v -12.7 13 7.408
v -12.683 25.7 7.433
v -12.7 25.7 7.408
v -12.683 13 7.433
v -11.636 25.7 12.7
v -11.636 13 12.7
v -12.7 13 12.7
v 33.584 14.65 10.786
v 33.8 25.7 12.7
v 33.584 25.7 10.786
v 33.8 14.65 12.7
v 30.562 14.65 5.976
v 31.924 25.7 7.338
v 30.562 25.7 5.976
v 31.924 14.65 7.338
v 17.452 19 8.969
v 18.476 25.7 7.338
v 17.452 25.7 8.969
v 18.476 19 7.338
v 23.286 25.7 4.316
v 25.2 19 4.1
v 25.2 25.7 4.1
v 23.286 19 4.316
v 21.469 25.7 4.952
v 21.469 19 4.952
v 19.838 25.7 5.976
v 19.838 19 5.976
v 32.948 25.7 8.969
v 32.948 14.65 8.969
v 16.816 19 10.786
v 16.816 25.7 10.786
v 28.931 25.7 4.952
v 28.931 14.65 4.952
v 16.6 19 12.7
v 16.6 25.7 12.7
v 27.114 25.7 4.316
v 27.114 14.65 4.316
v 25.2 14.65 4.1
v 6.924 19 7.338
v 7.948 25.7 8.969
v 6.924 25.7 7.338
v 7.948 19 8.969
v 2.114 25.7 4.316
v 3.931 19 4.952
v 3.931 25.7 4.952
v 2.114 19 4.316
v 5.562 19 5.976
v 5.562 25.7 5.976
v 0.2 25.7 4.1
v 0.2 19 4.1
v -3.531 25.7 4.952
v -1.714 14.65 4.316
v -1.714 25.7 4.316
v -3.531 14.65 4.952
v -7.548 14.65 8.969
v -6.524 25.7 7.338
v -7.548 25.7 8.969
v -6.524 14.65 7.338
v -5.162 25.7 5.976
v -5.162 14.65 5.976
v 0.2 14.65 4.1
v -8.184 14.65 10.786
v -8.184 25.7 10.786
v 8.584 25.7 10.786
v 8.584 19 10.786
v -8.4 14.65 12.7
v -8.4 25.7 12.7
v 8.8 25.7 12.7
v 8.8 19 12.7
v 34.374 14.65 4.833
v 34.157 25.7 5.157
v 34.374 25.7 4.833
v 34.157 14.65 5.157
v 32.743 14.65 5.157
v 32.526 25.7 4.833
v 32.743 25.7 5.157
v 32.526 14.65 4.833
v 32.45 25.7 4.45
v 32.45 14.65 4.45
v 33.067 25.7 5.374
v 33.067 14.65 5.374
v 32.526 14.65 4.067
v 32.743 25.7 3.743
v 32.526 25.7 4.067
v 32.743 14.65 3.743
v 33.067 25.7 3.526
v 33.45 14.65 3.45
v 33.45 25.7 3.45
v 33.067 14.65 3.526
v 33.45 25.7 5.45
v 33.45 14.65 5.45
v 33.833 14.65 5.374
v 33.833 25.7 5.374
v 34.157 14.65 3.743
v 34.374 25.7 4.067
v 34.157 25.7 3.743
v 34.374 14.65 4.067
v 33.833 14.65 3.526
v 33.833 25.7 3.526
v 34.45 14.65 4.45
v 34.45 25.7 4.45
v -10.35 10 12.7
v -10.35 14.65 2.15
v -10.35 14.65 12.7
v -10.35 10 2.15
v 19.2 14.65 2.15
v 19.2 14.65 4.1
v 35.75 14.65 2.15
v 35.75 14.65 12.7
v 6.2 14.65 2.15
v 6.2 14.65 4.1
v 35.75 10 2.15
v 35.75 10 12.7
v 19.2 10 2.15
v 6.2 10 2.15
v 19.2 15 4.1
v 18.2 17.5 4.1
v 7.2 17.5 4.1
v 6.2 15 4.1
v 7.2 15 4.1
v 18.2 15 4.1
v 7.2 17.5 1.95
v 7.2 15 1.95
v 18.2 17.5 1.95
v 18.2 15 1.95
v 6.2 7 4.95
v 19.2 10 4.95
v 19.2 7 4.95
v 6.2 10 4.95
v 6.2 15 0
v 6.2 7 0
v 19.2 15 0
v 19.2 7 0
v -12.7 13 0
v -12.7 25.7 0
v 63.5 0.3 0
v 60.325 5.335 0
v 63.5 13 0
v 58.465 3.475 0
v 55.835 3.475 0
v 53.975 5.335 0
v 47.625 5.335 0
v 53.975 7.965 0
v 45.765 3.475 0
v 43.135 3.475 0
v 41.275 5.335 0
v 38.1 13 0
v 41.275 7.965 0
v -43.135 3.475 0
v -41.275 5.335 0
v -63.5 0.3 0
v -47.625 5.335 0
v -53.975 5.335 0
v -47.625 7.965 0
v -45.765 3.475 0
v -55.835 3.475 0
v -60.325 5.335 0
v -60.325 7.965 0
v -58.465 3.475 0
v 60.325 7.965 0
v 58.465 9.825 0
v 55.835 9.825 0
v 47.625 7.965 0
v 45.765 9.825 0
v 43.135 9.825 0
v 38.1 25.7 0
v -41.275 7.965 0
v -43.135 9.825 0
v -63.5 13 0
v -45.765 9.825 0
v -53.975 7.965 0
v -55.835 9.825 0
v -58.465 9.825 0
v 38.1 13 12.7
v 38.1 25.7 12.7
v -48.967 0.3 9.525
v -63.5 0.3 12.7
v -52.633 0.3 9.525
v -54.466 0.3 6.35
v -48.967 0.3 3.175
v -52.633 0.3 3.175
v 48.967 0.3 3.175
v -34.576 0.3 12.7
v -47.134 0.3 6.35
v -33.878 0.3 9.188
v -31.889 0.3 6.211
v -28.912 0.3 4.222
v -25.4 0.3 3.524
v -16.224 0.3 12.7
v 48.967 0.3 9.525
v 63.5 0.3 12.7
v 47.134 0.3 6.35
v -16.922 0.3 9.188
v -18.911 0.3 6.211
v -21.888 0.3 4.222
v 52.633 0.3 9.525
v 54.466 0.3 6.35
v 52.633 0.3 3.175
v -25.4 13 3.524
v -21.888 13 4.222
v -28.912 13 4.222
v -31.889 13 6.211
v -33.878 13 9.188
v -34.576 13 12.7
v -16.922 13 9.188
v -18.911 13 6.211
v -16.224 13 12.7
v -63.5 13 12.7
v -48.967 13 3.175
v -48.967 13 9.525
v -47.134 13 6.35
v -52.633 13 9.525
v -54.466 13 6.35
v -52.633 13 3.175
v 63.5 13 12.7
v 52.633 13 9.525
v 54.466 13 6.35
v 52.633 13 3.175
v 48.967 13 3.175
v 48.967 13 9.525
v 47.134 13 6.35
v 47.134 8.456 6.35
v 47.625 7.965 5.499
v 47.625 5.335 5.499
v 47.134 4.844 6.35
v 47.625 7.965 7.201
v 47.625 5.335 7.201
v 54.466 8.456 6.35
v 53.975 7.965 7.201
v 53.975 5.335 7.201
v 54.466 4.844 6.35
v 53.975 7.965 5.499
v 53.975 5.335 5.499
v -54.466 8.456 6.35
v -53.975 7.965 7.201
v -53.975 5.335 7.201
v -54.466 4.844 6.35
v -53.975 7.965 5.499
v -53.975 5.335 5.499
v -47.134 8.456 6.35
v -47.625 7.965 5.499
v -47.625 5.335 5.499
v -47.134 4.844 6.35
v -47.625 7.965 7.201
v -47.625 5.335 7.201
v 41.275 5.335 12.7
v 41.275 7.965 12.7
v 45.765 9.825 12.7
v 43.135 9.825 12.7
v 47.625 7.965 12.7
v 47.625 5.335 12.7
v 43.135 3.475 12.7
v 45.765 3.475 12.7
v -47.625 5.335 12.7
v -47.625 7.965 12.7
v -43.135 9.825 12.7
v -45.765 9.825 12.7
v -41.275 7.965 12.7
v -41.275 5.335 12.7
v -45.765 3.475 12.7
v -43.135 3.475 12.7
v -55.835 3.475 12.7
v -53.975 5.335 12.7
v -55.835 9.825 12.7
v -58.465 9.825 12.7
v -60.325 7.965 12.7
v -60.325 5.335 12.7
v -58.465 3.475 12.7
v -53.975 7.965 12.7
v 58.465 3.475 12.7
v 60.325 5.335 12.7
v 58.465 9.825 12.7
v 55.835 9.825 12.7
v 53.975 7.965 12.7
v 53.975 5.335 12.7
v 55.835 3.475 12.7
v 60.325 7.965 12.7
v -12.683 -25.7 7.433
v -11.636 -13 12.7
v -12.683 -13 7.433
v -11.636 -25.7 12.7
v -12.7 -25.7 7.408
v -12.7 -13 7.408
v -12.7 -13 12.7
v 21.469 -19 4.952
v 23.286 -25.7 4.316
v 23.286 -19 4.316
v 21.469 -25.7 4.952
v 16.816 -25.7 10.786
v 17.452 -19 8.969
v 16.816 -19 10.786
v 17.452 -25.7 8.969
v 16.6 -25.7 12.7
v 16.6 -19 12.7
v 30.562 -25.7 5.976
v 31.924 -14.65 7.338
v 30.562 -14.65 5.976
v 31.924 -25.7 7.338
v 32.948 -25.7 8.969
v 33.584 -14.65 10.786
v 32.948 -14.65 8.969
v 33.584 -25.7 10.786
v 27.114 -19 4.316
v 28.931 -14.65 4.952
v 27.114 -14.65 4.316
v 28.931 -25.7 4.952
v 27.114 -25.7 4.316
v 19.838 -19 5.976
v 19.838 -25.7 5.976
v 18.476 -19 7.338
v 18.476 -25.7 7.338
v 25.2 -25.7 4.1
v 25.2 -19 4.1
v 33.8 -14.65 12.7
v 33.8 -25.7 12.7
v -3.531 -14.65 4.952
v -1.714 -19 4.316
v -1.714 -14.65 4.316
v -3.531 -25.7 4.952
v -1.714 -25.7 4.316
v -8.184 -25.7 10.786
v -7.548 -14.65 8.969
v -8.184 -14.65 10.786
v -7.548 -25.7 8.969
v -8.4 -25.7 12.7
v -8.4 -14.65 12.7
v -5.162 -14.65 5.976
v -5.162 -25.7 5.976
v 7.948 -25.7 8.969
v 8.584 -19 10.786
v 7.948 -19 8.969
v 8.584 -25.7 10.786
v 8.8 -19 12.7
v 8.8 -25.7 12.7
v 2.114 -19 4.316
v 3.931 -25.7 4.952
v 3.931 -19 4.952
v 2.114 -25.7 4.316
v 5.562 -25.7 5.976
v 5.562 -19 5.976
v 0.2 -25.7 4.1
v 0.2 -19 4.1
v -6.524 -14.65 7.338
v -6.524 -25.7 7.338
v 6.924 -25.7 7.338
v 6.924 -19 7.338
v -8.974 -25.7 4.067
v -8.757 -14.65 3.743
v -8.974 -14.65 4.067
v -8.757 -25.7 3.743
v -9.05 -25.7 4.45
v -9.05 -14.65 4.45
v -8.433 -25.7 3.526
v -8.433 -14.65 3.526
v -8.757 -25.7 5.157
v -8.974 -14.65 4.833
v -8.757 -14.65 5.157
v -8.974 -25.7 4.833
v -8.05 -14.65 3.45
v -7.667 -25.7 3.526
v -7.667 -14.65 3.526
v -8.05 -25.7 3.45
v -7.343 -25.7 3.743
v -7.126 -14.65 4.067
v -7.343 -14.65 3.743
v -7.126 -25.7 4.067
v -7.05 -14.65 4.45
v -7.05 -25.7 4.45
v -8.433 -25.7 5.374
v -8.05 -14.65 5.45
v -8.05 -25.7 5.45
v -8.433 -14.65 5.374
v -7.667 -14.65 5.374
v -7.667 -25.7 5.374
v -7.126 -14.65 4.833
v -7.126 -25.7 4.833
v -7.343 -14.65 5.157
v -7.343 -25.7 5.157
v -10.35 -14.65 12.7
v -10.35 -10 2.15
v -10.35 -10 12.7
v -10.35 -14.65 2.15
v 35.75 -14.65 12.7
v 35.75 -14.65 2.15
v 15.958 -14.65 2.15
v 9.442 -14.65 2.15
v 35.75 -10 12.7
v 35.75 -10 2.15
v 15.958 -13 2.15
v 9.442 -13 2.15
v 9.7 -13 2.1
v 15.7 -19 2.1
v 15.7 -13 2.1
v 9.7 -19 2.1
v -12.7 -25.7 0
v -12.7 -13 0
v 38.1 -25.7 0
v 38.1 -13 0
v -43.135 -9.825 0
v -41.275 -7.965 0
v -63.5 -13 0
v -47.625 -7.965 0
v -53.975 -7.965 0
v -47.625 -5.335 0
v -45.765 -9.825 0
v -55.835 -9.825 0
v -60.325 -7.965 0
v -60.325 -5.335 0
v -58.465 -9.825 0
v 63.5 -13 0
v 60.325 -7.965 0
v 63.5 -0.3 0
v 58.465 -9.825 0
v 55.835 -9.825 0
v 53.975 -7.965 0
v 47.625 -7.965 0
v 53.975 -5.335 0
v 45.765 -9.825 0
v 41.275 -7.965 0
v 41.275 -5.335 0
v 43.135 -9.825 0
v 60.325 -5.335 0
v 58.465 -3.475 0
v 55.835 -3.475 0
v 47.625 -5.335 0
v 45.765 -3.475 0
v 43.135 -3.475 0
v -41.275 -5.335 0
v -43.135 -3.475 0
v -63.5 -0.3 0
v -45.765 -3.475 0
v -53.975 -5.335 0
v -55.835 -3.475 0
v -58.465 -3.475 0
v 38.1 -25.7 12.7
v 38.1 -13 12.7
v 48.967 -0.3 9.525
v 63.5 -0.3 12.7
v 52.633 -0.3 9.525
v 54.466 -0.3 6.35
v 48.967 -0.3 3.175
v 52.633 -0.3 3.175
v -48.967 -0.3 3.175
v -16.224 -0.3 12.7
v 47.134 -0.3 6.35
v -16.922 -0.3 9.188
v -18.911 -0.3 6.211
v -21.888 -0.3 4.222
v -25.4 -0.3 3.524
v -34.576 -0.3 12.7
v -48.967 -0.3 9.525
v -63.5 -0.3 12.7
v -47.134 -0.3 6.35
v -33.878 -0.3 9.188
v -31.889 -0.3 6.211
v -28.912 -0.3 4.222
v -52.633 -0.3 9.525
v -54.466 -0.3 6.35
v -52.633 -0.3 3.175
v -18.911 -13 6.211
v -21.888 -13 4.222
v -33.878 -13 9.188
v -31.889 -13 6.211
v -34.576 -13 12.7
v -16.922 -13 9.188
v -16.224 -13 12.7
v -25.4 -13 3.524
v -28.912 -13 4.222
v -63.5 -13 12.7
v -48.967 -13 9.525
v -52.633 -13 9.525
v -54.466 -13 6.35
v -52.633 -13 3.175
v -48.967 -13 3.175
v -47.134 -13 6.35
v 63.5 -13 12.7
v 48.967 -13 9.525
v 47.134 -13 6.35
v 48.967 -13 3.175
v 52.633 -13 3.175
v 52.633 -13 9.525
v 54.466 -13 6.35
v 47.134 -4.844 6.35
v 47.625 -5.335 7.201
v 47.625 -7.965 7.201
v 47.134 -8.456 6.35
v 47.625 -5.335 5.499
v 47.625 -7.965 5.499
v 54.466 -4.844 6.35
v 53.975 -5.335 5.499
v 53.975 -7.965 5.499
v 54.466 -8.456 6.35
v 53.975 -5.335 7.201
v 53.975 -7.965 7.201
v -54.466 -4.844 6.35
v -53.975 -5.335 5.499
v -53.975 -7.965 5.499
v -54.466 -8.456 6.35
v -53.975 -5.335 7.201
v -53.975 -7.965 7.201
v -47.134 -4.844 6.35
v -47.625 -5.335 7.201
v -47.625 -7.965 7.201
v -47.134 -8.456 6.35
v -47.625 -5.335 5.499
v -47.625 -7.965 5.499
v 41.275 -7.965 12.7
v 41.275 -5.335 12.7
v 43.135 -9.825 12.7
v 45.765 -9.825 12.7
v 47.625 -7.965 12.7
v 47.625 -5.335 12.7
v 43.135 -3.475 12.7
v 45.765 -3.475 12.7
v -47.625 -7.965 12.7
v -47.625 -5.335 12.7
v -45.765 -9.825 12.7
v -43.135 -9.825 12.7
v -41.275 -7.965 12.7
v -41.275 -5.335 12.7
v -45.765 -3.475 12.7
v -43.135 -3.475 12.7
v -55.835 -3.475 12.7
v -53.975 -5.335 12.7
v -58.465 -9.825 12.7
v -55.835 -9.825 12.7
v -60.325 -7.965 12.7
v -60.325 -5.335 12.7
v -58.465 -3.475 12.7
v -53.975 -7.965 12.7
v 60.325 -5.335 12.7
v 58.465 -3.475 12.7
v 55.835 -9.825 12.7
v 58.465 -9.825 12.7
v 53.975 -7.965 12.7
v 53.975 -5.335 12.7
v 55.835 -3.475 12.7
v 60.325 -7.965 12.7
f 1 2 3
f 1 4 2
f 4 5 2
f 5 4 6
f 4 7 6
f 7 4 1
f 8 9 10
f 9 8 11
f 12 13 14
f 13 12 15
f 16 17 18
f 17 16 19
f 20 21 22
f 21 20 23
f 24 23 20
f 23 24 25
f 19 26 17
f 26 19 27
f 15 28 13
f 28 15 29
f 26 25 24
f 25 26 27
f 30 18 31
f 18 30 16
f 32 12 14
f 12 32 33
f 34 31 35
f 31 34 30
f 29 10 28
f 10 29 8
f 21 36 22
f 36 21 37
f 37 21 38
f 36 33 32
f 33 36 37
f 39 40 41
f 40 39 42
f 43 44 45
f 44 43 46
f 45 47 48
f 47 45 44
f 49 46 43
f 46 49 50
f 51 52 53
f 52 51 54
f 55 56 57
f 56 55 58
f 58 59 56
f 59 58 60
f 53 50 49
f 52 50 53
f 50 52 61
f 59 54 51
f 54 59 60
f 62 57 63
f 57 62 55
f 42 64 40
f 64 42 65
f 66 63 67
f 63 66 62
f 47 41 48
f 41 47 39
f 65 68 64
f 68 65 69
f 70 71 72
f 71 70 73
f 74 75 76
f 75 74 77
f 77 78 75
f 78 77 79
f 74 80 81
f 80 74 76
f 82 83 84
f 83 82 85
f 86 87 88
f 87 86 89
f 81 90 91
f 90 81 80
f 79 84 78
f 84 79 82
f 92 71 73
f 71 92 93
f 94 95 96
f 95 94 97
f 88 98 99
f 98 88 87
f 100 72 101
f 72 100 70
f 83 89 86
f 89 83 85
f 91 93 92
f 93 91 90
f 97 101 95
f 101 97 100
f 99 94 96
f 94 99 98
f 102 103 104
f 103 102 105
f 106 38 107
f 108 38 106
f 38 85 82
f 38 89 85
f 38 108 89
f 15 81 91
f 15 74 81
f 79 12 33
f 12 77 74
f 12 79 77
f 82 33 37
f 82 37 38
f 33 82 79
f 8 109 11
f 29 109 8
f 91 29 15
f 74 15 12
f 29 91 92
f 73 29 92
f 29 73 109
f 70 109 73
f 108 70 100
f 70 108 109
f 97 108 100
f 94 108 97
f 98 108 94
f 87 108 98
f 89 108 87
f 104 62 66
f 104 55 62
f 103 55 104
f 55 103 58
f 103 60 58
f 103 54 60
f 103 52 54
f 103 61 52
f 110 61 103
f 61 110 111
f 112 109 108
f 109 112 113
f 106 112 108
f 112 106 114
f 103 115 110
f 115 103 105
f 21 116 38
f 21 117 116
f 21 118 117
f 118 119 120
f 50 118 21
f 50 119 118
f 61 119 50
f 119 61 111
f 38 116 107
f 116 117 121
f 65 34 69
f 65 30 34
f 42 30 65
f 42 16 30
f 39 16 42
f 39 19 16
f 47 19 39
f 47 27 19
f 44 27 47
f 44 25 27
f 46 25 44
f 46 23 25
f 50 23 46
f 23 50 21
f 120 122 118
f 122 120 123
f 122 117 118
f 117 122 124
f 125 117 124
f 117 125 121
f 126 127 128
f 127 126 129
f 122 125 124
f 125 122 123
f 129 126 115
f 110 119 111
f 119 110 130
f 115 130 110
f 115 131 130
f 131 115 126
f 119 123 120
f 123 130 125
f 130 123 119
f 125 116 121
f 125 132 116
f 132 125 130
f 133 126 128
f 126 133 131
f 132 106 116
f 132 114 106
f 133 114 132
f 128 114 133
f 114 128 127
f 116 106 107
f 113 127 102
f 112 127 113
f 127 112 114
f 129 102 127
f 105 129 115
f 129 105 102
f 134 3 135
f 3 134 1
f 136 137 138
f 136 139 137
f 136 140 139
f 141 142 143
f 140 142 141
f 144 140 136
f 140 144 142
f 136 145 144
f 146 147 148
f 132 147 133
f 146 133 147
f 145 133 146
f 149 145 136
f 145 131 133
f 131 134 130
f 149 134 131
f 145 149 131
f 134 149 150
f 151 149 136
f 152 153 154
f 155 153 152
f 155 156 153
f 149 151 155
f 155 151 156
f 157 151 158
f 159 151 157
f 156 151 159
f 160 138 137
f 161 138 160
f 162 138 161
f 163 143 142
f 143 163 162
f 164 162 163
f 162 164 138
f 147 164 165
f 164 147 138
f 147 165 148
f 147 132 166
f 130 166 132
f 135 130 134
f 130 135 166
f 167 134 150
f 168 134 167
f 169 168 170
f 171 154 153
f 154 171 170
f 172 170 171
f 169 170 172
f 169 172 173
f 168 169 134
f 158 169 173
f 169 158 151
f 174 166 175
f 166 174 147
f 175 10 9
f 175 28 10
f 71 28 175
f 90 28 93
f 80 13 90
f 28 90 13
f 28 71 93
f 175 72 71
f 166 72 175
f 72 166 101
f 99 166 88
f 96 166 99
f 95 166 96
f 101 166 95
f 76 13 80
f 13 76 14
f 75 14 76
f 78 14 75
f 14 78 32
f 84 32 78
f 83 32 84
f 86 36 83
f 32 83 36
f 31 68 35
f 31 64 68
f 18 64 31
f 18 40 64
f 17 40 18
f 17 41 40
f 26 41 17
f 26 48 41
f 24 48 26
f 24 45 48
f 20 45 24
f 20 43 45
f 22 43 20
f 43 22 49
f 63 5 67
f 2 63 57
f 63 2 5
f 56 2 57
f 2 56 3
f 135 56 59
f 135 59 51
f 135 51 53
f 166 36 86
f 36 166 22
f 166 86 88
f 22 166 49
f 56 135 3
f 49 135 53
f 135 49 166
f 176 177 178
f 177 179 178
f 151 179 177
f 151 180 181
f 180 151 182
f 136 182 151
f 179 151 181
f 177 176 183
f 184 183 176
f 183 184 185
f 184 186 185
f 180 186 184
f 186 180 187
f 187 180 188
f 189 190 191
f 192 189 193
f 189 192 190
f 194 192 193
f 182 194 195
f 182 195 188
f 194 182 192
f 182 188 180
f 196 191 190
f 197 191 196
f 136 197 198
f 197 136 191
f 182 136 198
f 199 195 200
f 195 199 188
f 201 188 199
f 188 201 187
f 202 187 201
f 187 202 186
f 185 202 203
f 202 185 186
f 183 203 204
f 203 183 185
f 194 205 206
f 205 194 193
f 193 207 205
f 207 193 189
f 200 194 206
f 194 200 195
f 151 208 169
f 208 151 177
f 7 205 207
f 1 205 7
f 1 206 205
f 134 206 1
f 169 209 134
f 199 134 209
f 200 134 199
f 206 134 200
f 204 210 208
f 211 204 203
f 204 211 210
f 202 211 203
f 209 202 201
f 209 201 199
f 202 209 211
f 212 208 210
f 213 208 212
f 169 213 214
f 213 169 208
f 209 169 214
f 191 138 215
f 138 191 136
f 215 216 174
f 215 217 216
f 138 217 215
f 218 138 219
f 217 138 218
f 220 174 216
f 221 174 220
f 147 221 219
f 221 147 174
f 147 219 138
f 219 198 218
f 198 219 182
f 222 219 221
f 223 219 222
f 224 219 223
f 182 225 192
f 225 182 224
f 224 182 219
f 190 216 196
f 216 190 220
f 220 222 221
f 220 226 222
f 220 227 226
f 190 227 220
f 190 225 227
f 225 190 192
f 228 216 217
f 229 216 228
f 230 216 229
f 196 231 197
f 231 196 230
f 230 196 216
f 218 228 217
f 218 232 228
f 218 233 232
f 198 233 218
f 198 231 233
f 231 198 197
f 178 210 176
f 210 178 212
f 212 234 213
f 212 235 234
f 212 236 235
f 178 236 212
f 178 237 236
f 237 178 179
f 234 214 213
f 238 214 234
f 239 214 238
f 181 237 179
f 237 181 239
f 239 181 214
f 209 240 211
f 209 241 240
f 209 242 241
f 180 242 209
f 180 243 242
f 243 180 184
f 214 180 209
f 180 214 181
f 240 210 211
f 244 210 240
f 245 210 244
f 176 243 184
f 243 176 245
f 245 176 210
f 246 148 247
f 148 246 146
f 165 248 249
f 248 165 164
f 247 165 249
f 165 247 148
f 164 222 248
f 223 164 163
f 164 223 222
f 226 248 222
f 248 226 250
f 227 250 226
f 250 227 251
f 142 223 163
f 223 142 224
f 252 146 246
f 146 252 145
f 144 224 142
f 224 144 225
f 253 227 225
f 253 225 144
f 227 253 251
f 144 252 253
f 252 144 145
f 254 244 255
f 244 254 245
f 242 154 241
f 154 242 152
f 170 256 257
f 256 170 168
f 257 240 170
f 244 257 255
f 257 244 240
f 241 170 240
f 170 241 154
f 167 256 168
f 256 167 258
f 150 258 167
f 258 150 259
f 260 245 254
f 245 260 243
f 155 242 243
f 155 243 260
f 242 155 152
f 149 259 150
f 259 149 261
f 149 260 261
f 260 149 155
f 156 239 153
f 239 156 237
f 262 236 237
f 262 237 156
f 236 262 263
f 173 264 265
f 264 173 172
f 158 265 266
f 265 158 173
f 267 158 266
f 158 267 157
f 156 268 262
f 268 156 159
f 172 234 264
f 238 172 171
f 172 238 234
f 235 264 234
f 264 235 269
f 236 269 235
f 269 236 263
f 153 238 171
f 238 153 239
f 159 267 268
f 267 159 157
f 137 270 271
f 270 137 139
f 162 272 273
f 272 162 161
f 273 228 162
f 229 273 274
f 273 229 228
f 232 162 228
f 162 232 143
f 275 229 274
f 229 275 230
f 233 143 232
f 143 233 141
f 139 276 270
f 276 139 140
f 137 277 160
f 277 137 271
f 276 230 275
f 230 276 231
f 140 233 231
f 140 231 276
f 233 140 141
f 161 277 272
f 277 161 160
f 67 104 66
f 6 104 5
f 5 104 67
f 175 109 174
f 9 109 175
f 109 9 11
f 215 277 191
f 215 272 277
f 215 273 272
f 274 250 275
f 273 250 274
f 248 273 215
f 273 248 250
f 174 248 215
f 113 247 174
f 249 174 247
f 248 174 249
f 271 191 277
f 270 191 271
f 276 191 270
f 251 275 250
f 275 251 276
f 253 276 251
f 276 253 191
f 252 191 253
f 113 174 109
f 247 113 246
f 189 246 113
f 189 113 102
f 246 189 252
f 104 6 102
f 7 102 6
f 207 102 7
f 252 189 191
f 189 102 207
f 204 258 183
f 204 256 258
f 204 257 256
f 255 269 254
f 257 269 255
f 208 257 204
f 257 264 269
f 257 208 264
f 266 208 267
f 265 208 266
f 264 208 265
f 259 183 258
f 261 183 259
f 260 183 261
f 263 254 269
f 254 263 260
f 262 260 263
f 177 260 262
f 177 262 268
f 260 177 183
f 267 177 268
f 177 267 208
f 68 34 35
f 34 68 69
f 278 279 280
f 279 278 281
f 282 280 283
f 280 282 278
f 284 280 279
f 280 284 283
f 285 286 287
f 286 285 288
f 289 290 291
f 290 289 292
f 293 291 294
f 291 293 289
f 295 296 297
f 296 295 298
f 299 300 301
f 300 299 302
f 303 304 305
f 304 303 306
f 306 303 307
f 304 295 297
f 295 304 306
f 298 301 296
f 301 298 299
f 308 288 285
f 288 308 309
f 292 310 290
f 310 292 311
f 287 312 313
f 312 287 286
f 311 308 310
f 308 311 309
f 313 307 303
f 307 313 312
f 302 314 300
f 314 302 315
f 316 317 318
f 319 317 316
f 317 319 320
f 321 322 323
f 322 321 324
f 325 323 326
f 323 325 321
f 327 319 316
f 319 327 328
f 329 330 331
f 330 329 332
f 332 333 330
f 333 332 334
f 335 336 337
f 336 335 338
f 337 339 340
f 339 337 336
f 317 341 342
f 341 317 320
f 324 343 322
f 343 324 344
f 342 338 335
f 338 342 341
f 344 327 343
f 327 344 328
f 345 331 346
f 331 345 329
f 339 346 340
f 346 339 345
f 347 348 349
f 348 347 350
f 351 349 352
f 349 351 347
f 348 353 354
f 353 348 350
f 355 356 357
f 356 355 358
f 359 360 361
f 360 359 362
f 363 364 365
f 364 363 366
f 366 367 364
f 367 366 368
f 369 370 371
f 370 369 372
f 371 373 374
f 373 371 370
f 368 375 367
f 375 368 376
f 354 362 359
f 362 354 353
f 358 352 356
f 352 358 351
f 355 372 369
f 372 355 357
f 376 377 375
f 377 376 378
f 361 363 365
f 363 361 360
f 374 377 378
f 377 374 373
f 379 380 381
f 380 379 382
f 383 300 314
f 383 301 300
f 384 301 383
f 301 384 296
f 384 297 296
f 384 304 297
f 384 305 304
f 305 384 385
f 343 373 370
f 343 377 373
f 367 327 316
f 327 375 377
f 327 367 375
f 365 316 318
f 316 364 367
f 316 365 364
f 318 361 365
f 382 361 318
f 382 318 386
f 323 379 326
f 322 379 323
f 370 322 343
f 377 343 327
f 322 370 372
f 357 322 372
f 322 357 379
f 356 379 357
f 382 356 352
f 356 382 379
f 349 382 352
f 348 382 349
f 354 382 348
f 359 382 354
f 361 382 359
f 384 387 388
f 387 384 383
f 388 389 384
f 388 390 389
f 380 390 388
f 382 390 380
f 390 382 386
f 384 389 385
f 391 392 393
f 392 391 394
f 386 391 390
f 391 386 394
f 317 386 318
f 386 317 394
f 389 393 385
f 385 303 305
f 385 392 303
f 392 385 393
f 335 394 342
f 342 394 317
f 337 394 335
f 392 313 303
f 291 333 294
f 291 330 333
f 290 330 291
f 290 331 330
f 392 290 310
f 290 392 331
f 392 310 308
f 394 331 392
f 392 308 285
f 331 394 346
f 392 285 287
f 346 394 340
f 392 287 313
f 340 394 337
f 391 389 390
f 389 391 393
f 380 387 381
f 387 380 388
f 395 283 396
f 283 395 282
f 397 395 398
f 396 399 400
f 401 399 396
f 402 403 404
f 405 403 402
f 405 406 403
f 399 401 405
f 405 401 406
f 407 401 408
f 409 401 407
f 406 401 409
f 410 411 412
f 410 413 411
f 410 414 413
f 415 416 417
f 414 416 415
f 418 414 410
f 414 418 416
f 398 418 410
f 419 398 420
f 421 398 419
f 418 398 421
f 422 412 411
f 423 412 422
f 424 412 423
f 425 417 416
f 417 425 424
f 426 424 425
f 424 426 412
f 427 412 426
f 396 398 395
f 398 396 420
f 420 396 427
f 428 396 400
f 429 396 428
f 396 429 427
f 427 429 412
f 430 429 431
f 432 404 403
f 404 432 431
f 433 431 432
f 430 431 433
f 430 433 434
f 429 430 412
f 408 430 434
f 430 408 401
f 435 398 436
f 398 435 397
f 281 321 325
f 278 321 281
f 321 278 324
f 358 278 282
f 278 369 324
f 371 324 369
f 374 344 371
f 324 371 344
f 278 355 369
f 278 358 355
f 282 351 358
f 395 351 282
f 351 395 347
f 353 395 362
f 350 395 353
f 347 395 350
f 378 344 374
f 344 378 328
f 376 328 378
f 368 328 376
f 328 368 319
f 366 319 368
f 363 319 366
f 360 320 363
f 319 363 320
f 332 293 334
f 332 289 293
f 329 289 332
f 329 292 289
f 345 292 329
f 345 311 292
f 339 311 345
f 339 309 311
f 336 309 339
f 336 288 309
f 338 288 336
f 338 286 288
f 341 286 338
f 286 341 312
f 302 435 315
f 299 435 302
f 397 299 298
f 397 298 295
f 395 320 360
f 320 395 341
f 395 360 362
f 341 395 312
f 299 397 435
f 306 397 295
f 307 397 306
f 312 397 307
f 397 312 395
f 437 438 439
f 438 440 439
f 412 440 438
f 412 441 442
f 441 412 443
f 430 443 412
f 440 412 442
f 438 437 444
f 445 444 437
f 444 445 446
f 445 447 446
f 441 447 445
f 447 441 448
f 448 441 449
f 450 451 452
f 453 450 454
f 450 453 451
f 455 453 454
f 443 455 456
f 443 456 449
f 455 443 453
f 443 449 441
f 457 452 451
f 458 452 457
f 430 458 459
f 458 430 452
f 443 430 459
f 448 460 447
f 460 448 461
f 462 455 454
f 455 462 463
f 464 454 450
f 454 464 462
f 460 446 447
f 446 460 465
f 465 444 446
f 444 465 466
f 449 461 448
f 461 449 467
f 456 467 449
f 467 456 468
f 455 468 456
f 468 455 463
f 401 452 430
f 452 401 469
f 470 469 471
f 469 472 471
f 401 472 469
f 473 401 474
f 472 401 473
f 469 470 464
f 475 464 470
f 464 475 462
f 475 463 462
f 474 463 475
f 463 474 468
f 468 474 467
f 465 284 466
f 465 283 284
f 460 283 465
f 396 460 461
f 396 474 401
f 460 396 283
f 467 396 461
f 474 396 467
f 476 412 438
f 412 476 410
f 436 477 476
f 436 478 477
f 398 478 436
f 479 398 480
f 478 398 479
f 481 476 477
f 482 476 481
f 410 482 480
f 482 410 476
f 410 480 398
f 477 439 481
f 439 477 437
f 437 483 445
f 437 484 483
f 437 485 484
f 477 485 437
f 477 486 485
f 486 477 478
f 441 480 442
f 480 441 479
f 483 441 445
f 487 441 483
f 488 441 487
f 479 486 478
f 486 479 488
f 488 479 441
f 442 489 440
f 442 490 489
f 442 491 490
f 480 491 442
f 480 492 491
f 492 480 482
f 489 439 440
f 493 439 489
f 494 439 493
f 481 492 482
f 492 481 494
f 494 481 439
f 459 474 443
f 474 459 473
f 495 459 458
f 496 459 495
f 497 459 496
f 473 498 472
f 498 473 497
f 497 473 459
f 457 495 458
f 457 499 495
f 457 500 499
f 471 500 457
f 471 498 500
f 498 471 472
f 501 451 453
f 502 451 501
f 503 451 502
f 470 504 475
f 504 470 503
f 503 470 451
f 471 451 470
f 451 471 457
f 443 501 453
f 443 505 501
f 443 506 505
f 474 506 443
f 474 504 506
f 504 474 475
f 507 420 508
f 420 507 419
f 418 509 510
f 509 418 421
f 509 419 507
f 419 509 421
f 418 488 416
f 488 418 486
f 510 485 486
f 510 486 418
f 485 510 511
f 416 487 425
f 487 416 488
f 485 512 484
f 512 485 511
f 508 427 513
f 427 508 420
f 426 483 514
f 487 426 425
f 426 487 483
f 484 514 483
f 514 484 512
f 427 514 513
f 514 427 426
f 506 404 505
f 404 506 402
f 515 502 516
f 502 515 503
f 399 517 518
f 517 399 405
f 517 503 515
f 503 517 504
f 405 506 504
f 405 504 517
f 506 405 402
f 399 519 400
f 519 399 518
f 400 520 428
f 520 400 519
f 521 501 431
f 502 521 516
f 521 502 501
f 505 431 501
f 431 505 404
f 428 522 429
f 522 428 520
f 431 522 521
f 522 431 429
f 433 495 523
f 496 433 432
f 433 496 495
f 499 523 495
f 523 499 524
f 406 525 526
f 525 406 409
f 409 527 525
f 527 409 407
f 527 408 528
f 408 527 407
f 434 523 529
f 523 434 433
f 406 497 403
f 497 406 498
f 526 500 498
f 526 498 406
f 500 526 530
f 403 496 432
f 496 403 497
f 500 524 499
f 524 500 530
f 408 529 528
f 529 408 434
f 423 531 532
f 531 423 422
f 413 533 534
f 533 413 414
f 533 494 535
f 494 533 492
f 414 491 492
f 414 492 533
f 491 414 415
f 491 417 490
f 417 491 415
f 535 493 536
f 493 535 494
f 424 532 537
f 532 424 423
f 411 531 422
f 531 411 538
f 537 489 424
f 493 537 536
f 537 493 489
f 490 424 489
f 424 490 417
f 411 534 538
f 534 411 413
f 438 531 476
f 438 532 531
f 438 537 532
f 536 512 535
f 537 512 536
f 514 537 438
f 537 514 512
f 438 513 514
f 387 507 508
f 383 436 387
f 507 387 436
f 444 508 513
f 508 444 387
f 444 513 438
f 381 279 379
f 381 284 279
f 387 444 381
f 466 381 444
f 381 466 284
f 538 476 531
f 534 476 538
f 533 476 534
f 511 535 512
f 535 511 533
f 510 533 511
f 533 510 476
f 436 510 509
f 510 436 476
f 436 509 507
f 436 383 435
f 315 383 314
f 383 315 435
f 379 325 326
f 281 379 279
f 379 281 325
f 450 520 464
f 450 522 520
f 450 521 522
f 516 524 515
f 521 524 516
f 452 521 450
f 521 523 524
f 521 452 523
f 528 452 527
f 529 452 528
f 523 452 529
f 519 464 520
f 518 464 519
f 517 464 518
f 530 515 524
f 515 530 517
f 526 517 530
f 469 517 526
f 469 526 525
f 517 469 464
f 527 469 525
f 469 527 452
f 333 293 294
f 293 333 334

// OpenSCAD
// file: hardware.scad
// CC-BY-SA
// Created by Caitlyn Byrne
// last modified 05 November 2016

// [machine screw diameter, socket head diameter, socket head len, socket head hex key size, pan head diameter, pan head len, pan head hex key size, nut wide, nut thick]

m3 = [3,
5.5, 3, 2.5, 
5.7, 1.65, 2,
5.5, 2.4];

m4 = [4,
7, 4, 3,
7.6, 2.2, 2.5,
7, 3.2];

m5 = [5,
8.5, 5, 4,
9.5, 2.75, 3,
8, 4];

m6 = [6,
10, 6, 5,
10.5, 3.3, 4,
10,5];



m8 = [8,
13,8,6,
14,4.4, 5,
13,6.5];

m10 = [10,
16,10,8,
17.5, 5.5, 6,
17,8];

m12 = [12,
18,12,10,
21,6.6, 8,
19,10];

i1_4 = [1/4*25.4,
3/8*25.4, 1/4*25.4, 3/16*25.4,
0.492*25.4, 0.175*25.4, 5/32*25.4,
7/16*25.4, 7/32*25.4];

i8 = [0.138*25.4,
0.27*25.4, 0.164*25.4, 9/64*25.4,
0.322*25.4,0.115*25.4, 3/32*25.4,
11/32*25.4, 1/8*25.4];

/// indicies
machine_screw_diameter = 0;
socket_head_diameter = 1;
socket_head_len = 2;
socket_head_hex_key = 3;
pan_head_diameter = 4;
pan_head_len = 5;
pan_head_hex_key = 6;
nut_wide = 7;
nut_thick = 8;


e3d_clearance = 20;

groove_top_thick = 4;
groove_top_dia = 16;
groove_mid_thick = 6;
groove_mid_dia = 12;
groove_bot_thick = 4;
groove_bot_dia = 16;

lm8uu_diameter = 15;
lm8uu_long = 24;
lm8uu_shaft_diameter = 8;

//lm8uu_hor(zip_ties=true);

small_ziptie_wide = 3;
small_ziptie_thick = 2;

module lm8uu_hor(zip_ties=false){
    
    translate([-lm8uu_long/2,0,0])
    rotate([0,90,0])
    cylinder_outer(lm8uu_long, lm8uu_diameter/2, 32);
    if (zip_ties == "outer"){
        for(x = [1,-1]){
            translate([x*lm8uu_long/3-small_ziptie_wide/2,0,0])
            rotate([0,90,0])
            difference(){
                cylinder_outer(small_ziptie_wide, lm8uu_diameter/2+1+small_ziptie_thick, 32);
                translate([0,0,-1])
                cylinder_outer(small_ziptie_wide+2, lm8uu_diameter/2+1, 32);
            }
        }
    }
    if (zip_ties == "inner"){
        for(x = [1,-1]){
            translate([x*lm8uu_long/4-small_ziptie_wide/2,0,0])
            rotate([0,90,0])
            difference(){
                cylinder_outer(small_ziptie_wide, lm8uu_diameter/2+1+small_ziptie_thick, 32);
                translate([0,0,-1])
                cylinder_outer(small_ziptie_wide+2, lm8uu_diameter/2+1, 32);
            }
        }
    }
    if (zip_ties == "center"){
        for(x = [0]){
            translate([x*lm8uu_long/3-small_ziptie_wide/2,0,0])
            rotate([0,90,0])
            difference(){
                cylinder_outer(small_ziptie_wide, lm8uu_diameter/2+1+small_ziptie_thick, 32);
                translate([0,0,-1])
                cylinder_outer(small_ziptie_wide+2, lm8uu_diameter/2+1, 32);
            }
        }
    }
}


module groove(){
    translate([0,-groove_mid_thick/2-groove_bot_thick])
    rotate([-90,0,0])
    union(){
        translate([0,0,.5])
        cylinder_outer(groove_top_thick+groove_mid_thick+groove_bot_thick-1, groove_mid_dia/2, 36);
        cylinder_outer(groove_bot_thick, groove_bot_dia/2, 36);
        translate([0,0,groove_bot_thick+groove_mid_thick])
        cylinder_outer(groove_top_thick, groove_top_dia/2, 36);
    }
}

module nut(nut_wide = 5.7, nut_thick = 3, bolt_dia = 3.5, extend = false, layer_height = 0.25){
    // extend = go below 0 for z, to allow a clean cut.
    if (extend == true){
        translate([0,0,-2])
        cylinder_outer(nut_thick+2,nut_wide/2, 6);
    } else {
        cylinder_outer(nut_thick, nut_wide/2, 6);
    }
    intersection(){
        cylinder_outer(nut_thick*2, nut_wide/2, 6);
        union(){
            translate([0,0,nut_thick])
            cube([nut_wide*2, bolt_dia, layer_height*2], center=true);
            translate([0,0,nut_thick+layer_height])
            cube([bolt_dia, bolt_dia, layer_height*2], center=true);
        }
    }
}

module bolt_head(bolt_head_dia = 5.7, head_thick = 3.5, bolt_dia = 3.5, extend = false, layer_height = .25){
    if (extend == true){
        translate([0,0,-1])
        cylinder_outer(head_thick+1,bolt_head_dia/2, 18);
    } else {
        cylinder_outer(head_thick,bolt_head_dia/2, 18);
    }
    intersection(){
        cylinder_outer(head_thick*2,bolt_head_dia/2, 18);
        union(){
            translate([0,0,head_thick])
            cube([bolt_head_dia*2, bolt_dia, layer_height*2], center=true);
            translate([0,0,head_thick+layer_height])
            cube([bolt_dia, bolt_dia, layer_height*2], center=true);
        }
    }
}

module rounded_cube(size, r=3, center=false, fn=32){
    hull(){
        for (x = [-1,1], y=[1,-1]){
            translate([x*(size[0]/2-r),y*(size[1]/2-r),0])
            if(center==true){
                rotate([0,0,360/(fn*2)])
                cylinder_outerc(size[2],r,fn);
            } else {
                rotate([0,0,360/(fn*2)])
                cylinder_outer(size[2],r,fn);
            }
        }
    }
}

module spherical_cube(size, r=3, center=false, fn=32){
    render()
    hull(){
        for (x = [-1,1], y=[1,-1], z=[-1,1]){
            translate([x*(size[0]/2-r),y*(size[1]/2-r),z*(size[2]/2-r)])
            if(center==true){
                rotate([0,0,360/(fn*2)])
                sphere(r,$fn=fn);
            } else {
                rotate([0,0,360/(fn*2)])
                sphere(r,$fn=fn);
            }
        }
    }
}

module wall(pointslist,r=1.5,center=false,fn=32){
    union(){
        for (idx = [0:1:len(pointslist)-2]){
            hull(){
                if (center==false){
                    translate([pointslist[idx][0],pointslist[idx][1],0])
                    cylinder_outer(pointslist[idx][2], r, fn);
                    translate([pointslist[idx+1][0],pointslist[idx+1][1],0])
                    cylinder_outer(pointslist[idx+1][2], r, fn);
                } else {
                    translate([pointslist[idx][0],pointslist[idx][1],0])
                    cylinder_outerc(pointslist[idx][2], r, fn);
                    translate([pointslist[idx+1][0],pointslist[idx+1][1],0])
                    cylinder_outerc(pointslist[idx+1][2], r, fn);
                }
                
            }
        }
    }
}

module cylinder_outer(height,radius,fn){
   fudge = 1/cos(180/fn);
   cylinder(h=height,r=radius*fudge,$fn=fn);}
   
module cylinder_outer(height,radius,fn){
   fudge = 1/cos(180/fn);
   cylinder(h=height,r=radius*fudge,$fn=fn);}
   
module cylinder_outerc(height,radius,fn){
   fudge = 1/cos(180/fn);
   cylinder(h=height,r=radius*fudge,$fn=fn,center=true);}

module cylinder_outer2(height,r1,r2,fn){
   fudge = 1/cos(180/fn);
   cylinder(h=height,r1=r1*fudge,r2=r2*fudge,$fn=fn);}
   
module cylinder_outer2c(height,r1,r2,fn){
   fudge = 1/cos(180/fn);
   cylinder(h=height,r1=r1*fudge,r2=r2*fudge,$fn=fn,center=true);}

module circle_outer(radius,fn){
   fudge = 1/cos(180/fn);
   circle(r=radius*fudge,$fn=fn);}
// main file
include <hardware.scad>

//adj_ir();
//sr04();

//housing1();

translate([0,13,0]) tophalf();
translate([0,-13,0]) rotate(180) bottomhalf();

module tophalf(){
    translate([0,0,12.7])
    rotate([0,180,0])
    intersection(){
        housing1();
        translate([0,0,12.7/2])
        cube([6*25.4,2*25.4,12.7],center=true);
    }
}

module bottomhalf(){
    translate([0,0,12.7])
    intersection(){
        housing1();
        translate([0,0,-12.7/2])
        cube([6*25.4,2*25.4,12.7],center=true);
    }
}

module housing1(){
    difference(){
        translate([12.7,0,0]){
            difference(){
                translate([-25.4,0,0])
                cube([25.4*2,25.4,25.4],center=true);
                translate([12.7,-55/2+12.7,0])
                adj_ir();
                translate([-25.4,0,0])
                rotate([0,0,0])
                sr04();
            }
            difference(){
                translate([25.4,-12.7/2,0])
                cube([25.4*2,12.7,25.4],center=true);
                translate([12.7,-14,0])
                adj_ir();
            }
            translate([-25.4*2.5,-12.7/2,0])
            cube([25.4,12.7,25.4],center=true);
        }
        for (x = [-2,2,],z=[-.25,.25]){
            translate([x*25.4,-26,z*25.4])
            rotate([-90,0,0])
//            rotate(360/12)
            cylinder_outer(52,1/4*25.4/2,6);
        }
        for(x = [-1.75,1.75,2.25,-2.25]){
            translate([x*25.4,-12.7/2,-20])
            rotate(360/16)
            cylinder_outer(40,25.4/4/2,8);
        }
    }
}

module adj_ir(){
    translate([0,-55/2,0])
    rotate([-90,00,0]){
        irlong = 55;
        cylinder_outer(irlong, 9, 16);
        translate([0,0,irlong-12.7])
        cylinder_outer(12.7, 27/2, 16);
        cylinder_outer(irlong-12.7-15,27/2,16);
    }
}

module sr04(){
    sonar_spacing=41-16;
    tolerance = 0.6;
    rotate([-90,0,0]){
        for(x = [-sonar_spacing/2,sonar_spacing/2]){
            translate([x,0,0])
            cylinder(r=8+tolerance,h=15);
        }
        translate([0,0,.75])
        cube([45.5+tolerance,20.5+tolerance,1.8],center=true);
        hull(){
            /*for(x = [-3,3]){
                translate([x,7.5,0])
                cylinder(r=2.5+tolerance,h=6,$fn=16);
            }*/
            // Special crystal for vertical insertion
            for(x = [-3,3]){
                translate([x,7.5,0])
                cylinder(r=2.5+tolerance,h=6,$fn=16);
            }
            for(x = [-sonar_spacing/2,sonar_spacing/2]){
                translate([x,0,0])
                cylinder(r=8+tolerance,h=6);
            }
        }
        for(i = [-1,1]){
            translate([i*41.5/2,i*16.5/2,-2])
            cylinder(r=1,h=15,$fn=16);
        }
        translate([0,-18.5/2,0])
        cube([11,3,9],center=true);
        translate([0,-18.5/2-20/2+1.5,-2])
        cube([13,20,8],center=true);
        difference(){
            translate([0,0,-1.25])
            //cube([45.5,20.5,3.5],center=true);
            cube([45.5+tolerance,20.5+tolerance,3.5],center=true);
            /*
            for(i = [-1,1]){
                translate([i*41.5/2,i*16.5/2,-5])
                cylinder(r=2,h=15,$fn=16);
                
            }*/
        }
    }
}
